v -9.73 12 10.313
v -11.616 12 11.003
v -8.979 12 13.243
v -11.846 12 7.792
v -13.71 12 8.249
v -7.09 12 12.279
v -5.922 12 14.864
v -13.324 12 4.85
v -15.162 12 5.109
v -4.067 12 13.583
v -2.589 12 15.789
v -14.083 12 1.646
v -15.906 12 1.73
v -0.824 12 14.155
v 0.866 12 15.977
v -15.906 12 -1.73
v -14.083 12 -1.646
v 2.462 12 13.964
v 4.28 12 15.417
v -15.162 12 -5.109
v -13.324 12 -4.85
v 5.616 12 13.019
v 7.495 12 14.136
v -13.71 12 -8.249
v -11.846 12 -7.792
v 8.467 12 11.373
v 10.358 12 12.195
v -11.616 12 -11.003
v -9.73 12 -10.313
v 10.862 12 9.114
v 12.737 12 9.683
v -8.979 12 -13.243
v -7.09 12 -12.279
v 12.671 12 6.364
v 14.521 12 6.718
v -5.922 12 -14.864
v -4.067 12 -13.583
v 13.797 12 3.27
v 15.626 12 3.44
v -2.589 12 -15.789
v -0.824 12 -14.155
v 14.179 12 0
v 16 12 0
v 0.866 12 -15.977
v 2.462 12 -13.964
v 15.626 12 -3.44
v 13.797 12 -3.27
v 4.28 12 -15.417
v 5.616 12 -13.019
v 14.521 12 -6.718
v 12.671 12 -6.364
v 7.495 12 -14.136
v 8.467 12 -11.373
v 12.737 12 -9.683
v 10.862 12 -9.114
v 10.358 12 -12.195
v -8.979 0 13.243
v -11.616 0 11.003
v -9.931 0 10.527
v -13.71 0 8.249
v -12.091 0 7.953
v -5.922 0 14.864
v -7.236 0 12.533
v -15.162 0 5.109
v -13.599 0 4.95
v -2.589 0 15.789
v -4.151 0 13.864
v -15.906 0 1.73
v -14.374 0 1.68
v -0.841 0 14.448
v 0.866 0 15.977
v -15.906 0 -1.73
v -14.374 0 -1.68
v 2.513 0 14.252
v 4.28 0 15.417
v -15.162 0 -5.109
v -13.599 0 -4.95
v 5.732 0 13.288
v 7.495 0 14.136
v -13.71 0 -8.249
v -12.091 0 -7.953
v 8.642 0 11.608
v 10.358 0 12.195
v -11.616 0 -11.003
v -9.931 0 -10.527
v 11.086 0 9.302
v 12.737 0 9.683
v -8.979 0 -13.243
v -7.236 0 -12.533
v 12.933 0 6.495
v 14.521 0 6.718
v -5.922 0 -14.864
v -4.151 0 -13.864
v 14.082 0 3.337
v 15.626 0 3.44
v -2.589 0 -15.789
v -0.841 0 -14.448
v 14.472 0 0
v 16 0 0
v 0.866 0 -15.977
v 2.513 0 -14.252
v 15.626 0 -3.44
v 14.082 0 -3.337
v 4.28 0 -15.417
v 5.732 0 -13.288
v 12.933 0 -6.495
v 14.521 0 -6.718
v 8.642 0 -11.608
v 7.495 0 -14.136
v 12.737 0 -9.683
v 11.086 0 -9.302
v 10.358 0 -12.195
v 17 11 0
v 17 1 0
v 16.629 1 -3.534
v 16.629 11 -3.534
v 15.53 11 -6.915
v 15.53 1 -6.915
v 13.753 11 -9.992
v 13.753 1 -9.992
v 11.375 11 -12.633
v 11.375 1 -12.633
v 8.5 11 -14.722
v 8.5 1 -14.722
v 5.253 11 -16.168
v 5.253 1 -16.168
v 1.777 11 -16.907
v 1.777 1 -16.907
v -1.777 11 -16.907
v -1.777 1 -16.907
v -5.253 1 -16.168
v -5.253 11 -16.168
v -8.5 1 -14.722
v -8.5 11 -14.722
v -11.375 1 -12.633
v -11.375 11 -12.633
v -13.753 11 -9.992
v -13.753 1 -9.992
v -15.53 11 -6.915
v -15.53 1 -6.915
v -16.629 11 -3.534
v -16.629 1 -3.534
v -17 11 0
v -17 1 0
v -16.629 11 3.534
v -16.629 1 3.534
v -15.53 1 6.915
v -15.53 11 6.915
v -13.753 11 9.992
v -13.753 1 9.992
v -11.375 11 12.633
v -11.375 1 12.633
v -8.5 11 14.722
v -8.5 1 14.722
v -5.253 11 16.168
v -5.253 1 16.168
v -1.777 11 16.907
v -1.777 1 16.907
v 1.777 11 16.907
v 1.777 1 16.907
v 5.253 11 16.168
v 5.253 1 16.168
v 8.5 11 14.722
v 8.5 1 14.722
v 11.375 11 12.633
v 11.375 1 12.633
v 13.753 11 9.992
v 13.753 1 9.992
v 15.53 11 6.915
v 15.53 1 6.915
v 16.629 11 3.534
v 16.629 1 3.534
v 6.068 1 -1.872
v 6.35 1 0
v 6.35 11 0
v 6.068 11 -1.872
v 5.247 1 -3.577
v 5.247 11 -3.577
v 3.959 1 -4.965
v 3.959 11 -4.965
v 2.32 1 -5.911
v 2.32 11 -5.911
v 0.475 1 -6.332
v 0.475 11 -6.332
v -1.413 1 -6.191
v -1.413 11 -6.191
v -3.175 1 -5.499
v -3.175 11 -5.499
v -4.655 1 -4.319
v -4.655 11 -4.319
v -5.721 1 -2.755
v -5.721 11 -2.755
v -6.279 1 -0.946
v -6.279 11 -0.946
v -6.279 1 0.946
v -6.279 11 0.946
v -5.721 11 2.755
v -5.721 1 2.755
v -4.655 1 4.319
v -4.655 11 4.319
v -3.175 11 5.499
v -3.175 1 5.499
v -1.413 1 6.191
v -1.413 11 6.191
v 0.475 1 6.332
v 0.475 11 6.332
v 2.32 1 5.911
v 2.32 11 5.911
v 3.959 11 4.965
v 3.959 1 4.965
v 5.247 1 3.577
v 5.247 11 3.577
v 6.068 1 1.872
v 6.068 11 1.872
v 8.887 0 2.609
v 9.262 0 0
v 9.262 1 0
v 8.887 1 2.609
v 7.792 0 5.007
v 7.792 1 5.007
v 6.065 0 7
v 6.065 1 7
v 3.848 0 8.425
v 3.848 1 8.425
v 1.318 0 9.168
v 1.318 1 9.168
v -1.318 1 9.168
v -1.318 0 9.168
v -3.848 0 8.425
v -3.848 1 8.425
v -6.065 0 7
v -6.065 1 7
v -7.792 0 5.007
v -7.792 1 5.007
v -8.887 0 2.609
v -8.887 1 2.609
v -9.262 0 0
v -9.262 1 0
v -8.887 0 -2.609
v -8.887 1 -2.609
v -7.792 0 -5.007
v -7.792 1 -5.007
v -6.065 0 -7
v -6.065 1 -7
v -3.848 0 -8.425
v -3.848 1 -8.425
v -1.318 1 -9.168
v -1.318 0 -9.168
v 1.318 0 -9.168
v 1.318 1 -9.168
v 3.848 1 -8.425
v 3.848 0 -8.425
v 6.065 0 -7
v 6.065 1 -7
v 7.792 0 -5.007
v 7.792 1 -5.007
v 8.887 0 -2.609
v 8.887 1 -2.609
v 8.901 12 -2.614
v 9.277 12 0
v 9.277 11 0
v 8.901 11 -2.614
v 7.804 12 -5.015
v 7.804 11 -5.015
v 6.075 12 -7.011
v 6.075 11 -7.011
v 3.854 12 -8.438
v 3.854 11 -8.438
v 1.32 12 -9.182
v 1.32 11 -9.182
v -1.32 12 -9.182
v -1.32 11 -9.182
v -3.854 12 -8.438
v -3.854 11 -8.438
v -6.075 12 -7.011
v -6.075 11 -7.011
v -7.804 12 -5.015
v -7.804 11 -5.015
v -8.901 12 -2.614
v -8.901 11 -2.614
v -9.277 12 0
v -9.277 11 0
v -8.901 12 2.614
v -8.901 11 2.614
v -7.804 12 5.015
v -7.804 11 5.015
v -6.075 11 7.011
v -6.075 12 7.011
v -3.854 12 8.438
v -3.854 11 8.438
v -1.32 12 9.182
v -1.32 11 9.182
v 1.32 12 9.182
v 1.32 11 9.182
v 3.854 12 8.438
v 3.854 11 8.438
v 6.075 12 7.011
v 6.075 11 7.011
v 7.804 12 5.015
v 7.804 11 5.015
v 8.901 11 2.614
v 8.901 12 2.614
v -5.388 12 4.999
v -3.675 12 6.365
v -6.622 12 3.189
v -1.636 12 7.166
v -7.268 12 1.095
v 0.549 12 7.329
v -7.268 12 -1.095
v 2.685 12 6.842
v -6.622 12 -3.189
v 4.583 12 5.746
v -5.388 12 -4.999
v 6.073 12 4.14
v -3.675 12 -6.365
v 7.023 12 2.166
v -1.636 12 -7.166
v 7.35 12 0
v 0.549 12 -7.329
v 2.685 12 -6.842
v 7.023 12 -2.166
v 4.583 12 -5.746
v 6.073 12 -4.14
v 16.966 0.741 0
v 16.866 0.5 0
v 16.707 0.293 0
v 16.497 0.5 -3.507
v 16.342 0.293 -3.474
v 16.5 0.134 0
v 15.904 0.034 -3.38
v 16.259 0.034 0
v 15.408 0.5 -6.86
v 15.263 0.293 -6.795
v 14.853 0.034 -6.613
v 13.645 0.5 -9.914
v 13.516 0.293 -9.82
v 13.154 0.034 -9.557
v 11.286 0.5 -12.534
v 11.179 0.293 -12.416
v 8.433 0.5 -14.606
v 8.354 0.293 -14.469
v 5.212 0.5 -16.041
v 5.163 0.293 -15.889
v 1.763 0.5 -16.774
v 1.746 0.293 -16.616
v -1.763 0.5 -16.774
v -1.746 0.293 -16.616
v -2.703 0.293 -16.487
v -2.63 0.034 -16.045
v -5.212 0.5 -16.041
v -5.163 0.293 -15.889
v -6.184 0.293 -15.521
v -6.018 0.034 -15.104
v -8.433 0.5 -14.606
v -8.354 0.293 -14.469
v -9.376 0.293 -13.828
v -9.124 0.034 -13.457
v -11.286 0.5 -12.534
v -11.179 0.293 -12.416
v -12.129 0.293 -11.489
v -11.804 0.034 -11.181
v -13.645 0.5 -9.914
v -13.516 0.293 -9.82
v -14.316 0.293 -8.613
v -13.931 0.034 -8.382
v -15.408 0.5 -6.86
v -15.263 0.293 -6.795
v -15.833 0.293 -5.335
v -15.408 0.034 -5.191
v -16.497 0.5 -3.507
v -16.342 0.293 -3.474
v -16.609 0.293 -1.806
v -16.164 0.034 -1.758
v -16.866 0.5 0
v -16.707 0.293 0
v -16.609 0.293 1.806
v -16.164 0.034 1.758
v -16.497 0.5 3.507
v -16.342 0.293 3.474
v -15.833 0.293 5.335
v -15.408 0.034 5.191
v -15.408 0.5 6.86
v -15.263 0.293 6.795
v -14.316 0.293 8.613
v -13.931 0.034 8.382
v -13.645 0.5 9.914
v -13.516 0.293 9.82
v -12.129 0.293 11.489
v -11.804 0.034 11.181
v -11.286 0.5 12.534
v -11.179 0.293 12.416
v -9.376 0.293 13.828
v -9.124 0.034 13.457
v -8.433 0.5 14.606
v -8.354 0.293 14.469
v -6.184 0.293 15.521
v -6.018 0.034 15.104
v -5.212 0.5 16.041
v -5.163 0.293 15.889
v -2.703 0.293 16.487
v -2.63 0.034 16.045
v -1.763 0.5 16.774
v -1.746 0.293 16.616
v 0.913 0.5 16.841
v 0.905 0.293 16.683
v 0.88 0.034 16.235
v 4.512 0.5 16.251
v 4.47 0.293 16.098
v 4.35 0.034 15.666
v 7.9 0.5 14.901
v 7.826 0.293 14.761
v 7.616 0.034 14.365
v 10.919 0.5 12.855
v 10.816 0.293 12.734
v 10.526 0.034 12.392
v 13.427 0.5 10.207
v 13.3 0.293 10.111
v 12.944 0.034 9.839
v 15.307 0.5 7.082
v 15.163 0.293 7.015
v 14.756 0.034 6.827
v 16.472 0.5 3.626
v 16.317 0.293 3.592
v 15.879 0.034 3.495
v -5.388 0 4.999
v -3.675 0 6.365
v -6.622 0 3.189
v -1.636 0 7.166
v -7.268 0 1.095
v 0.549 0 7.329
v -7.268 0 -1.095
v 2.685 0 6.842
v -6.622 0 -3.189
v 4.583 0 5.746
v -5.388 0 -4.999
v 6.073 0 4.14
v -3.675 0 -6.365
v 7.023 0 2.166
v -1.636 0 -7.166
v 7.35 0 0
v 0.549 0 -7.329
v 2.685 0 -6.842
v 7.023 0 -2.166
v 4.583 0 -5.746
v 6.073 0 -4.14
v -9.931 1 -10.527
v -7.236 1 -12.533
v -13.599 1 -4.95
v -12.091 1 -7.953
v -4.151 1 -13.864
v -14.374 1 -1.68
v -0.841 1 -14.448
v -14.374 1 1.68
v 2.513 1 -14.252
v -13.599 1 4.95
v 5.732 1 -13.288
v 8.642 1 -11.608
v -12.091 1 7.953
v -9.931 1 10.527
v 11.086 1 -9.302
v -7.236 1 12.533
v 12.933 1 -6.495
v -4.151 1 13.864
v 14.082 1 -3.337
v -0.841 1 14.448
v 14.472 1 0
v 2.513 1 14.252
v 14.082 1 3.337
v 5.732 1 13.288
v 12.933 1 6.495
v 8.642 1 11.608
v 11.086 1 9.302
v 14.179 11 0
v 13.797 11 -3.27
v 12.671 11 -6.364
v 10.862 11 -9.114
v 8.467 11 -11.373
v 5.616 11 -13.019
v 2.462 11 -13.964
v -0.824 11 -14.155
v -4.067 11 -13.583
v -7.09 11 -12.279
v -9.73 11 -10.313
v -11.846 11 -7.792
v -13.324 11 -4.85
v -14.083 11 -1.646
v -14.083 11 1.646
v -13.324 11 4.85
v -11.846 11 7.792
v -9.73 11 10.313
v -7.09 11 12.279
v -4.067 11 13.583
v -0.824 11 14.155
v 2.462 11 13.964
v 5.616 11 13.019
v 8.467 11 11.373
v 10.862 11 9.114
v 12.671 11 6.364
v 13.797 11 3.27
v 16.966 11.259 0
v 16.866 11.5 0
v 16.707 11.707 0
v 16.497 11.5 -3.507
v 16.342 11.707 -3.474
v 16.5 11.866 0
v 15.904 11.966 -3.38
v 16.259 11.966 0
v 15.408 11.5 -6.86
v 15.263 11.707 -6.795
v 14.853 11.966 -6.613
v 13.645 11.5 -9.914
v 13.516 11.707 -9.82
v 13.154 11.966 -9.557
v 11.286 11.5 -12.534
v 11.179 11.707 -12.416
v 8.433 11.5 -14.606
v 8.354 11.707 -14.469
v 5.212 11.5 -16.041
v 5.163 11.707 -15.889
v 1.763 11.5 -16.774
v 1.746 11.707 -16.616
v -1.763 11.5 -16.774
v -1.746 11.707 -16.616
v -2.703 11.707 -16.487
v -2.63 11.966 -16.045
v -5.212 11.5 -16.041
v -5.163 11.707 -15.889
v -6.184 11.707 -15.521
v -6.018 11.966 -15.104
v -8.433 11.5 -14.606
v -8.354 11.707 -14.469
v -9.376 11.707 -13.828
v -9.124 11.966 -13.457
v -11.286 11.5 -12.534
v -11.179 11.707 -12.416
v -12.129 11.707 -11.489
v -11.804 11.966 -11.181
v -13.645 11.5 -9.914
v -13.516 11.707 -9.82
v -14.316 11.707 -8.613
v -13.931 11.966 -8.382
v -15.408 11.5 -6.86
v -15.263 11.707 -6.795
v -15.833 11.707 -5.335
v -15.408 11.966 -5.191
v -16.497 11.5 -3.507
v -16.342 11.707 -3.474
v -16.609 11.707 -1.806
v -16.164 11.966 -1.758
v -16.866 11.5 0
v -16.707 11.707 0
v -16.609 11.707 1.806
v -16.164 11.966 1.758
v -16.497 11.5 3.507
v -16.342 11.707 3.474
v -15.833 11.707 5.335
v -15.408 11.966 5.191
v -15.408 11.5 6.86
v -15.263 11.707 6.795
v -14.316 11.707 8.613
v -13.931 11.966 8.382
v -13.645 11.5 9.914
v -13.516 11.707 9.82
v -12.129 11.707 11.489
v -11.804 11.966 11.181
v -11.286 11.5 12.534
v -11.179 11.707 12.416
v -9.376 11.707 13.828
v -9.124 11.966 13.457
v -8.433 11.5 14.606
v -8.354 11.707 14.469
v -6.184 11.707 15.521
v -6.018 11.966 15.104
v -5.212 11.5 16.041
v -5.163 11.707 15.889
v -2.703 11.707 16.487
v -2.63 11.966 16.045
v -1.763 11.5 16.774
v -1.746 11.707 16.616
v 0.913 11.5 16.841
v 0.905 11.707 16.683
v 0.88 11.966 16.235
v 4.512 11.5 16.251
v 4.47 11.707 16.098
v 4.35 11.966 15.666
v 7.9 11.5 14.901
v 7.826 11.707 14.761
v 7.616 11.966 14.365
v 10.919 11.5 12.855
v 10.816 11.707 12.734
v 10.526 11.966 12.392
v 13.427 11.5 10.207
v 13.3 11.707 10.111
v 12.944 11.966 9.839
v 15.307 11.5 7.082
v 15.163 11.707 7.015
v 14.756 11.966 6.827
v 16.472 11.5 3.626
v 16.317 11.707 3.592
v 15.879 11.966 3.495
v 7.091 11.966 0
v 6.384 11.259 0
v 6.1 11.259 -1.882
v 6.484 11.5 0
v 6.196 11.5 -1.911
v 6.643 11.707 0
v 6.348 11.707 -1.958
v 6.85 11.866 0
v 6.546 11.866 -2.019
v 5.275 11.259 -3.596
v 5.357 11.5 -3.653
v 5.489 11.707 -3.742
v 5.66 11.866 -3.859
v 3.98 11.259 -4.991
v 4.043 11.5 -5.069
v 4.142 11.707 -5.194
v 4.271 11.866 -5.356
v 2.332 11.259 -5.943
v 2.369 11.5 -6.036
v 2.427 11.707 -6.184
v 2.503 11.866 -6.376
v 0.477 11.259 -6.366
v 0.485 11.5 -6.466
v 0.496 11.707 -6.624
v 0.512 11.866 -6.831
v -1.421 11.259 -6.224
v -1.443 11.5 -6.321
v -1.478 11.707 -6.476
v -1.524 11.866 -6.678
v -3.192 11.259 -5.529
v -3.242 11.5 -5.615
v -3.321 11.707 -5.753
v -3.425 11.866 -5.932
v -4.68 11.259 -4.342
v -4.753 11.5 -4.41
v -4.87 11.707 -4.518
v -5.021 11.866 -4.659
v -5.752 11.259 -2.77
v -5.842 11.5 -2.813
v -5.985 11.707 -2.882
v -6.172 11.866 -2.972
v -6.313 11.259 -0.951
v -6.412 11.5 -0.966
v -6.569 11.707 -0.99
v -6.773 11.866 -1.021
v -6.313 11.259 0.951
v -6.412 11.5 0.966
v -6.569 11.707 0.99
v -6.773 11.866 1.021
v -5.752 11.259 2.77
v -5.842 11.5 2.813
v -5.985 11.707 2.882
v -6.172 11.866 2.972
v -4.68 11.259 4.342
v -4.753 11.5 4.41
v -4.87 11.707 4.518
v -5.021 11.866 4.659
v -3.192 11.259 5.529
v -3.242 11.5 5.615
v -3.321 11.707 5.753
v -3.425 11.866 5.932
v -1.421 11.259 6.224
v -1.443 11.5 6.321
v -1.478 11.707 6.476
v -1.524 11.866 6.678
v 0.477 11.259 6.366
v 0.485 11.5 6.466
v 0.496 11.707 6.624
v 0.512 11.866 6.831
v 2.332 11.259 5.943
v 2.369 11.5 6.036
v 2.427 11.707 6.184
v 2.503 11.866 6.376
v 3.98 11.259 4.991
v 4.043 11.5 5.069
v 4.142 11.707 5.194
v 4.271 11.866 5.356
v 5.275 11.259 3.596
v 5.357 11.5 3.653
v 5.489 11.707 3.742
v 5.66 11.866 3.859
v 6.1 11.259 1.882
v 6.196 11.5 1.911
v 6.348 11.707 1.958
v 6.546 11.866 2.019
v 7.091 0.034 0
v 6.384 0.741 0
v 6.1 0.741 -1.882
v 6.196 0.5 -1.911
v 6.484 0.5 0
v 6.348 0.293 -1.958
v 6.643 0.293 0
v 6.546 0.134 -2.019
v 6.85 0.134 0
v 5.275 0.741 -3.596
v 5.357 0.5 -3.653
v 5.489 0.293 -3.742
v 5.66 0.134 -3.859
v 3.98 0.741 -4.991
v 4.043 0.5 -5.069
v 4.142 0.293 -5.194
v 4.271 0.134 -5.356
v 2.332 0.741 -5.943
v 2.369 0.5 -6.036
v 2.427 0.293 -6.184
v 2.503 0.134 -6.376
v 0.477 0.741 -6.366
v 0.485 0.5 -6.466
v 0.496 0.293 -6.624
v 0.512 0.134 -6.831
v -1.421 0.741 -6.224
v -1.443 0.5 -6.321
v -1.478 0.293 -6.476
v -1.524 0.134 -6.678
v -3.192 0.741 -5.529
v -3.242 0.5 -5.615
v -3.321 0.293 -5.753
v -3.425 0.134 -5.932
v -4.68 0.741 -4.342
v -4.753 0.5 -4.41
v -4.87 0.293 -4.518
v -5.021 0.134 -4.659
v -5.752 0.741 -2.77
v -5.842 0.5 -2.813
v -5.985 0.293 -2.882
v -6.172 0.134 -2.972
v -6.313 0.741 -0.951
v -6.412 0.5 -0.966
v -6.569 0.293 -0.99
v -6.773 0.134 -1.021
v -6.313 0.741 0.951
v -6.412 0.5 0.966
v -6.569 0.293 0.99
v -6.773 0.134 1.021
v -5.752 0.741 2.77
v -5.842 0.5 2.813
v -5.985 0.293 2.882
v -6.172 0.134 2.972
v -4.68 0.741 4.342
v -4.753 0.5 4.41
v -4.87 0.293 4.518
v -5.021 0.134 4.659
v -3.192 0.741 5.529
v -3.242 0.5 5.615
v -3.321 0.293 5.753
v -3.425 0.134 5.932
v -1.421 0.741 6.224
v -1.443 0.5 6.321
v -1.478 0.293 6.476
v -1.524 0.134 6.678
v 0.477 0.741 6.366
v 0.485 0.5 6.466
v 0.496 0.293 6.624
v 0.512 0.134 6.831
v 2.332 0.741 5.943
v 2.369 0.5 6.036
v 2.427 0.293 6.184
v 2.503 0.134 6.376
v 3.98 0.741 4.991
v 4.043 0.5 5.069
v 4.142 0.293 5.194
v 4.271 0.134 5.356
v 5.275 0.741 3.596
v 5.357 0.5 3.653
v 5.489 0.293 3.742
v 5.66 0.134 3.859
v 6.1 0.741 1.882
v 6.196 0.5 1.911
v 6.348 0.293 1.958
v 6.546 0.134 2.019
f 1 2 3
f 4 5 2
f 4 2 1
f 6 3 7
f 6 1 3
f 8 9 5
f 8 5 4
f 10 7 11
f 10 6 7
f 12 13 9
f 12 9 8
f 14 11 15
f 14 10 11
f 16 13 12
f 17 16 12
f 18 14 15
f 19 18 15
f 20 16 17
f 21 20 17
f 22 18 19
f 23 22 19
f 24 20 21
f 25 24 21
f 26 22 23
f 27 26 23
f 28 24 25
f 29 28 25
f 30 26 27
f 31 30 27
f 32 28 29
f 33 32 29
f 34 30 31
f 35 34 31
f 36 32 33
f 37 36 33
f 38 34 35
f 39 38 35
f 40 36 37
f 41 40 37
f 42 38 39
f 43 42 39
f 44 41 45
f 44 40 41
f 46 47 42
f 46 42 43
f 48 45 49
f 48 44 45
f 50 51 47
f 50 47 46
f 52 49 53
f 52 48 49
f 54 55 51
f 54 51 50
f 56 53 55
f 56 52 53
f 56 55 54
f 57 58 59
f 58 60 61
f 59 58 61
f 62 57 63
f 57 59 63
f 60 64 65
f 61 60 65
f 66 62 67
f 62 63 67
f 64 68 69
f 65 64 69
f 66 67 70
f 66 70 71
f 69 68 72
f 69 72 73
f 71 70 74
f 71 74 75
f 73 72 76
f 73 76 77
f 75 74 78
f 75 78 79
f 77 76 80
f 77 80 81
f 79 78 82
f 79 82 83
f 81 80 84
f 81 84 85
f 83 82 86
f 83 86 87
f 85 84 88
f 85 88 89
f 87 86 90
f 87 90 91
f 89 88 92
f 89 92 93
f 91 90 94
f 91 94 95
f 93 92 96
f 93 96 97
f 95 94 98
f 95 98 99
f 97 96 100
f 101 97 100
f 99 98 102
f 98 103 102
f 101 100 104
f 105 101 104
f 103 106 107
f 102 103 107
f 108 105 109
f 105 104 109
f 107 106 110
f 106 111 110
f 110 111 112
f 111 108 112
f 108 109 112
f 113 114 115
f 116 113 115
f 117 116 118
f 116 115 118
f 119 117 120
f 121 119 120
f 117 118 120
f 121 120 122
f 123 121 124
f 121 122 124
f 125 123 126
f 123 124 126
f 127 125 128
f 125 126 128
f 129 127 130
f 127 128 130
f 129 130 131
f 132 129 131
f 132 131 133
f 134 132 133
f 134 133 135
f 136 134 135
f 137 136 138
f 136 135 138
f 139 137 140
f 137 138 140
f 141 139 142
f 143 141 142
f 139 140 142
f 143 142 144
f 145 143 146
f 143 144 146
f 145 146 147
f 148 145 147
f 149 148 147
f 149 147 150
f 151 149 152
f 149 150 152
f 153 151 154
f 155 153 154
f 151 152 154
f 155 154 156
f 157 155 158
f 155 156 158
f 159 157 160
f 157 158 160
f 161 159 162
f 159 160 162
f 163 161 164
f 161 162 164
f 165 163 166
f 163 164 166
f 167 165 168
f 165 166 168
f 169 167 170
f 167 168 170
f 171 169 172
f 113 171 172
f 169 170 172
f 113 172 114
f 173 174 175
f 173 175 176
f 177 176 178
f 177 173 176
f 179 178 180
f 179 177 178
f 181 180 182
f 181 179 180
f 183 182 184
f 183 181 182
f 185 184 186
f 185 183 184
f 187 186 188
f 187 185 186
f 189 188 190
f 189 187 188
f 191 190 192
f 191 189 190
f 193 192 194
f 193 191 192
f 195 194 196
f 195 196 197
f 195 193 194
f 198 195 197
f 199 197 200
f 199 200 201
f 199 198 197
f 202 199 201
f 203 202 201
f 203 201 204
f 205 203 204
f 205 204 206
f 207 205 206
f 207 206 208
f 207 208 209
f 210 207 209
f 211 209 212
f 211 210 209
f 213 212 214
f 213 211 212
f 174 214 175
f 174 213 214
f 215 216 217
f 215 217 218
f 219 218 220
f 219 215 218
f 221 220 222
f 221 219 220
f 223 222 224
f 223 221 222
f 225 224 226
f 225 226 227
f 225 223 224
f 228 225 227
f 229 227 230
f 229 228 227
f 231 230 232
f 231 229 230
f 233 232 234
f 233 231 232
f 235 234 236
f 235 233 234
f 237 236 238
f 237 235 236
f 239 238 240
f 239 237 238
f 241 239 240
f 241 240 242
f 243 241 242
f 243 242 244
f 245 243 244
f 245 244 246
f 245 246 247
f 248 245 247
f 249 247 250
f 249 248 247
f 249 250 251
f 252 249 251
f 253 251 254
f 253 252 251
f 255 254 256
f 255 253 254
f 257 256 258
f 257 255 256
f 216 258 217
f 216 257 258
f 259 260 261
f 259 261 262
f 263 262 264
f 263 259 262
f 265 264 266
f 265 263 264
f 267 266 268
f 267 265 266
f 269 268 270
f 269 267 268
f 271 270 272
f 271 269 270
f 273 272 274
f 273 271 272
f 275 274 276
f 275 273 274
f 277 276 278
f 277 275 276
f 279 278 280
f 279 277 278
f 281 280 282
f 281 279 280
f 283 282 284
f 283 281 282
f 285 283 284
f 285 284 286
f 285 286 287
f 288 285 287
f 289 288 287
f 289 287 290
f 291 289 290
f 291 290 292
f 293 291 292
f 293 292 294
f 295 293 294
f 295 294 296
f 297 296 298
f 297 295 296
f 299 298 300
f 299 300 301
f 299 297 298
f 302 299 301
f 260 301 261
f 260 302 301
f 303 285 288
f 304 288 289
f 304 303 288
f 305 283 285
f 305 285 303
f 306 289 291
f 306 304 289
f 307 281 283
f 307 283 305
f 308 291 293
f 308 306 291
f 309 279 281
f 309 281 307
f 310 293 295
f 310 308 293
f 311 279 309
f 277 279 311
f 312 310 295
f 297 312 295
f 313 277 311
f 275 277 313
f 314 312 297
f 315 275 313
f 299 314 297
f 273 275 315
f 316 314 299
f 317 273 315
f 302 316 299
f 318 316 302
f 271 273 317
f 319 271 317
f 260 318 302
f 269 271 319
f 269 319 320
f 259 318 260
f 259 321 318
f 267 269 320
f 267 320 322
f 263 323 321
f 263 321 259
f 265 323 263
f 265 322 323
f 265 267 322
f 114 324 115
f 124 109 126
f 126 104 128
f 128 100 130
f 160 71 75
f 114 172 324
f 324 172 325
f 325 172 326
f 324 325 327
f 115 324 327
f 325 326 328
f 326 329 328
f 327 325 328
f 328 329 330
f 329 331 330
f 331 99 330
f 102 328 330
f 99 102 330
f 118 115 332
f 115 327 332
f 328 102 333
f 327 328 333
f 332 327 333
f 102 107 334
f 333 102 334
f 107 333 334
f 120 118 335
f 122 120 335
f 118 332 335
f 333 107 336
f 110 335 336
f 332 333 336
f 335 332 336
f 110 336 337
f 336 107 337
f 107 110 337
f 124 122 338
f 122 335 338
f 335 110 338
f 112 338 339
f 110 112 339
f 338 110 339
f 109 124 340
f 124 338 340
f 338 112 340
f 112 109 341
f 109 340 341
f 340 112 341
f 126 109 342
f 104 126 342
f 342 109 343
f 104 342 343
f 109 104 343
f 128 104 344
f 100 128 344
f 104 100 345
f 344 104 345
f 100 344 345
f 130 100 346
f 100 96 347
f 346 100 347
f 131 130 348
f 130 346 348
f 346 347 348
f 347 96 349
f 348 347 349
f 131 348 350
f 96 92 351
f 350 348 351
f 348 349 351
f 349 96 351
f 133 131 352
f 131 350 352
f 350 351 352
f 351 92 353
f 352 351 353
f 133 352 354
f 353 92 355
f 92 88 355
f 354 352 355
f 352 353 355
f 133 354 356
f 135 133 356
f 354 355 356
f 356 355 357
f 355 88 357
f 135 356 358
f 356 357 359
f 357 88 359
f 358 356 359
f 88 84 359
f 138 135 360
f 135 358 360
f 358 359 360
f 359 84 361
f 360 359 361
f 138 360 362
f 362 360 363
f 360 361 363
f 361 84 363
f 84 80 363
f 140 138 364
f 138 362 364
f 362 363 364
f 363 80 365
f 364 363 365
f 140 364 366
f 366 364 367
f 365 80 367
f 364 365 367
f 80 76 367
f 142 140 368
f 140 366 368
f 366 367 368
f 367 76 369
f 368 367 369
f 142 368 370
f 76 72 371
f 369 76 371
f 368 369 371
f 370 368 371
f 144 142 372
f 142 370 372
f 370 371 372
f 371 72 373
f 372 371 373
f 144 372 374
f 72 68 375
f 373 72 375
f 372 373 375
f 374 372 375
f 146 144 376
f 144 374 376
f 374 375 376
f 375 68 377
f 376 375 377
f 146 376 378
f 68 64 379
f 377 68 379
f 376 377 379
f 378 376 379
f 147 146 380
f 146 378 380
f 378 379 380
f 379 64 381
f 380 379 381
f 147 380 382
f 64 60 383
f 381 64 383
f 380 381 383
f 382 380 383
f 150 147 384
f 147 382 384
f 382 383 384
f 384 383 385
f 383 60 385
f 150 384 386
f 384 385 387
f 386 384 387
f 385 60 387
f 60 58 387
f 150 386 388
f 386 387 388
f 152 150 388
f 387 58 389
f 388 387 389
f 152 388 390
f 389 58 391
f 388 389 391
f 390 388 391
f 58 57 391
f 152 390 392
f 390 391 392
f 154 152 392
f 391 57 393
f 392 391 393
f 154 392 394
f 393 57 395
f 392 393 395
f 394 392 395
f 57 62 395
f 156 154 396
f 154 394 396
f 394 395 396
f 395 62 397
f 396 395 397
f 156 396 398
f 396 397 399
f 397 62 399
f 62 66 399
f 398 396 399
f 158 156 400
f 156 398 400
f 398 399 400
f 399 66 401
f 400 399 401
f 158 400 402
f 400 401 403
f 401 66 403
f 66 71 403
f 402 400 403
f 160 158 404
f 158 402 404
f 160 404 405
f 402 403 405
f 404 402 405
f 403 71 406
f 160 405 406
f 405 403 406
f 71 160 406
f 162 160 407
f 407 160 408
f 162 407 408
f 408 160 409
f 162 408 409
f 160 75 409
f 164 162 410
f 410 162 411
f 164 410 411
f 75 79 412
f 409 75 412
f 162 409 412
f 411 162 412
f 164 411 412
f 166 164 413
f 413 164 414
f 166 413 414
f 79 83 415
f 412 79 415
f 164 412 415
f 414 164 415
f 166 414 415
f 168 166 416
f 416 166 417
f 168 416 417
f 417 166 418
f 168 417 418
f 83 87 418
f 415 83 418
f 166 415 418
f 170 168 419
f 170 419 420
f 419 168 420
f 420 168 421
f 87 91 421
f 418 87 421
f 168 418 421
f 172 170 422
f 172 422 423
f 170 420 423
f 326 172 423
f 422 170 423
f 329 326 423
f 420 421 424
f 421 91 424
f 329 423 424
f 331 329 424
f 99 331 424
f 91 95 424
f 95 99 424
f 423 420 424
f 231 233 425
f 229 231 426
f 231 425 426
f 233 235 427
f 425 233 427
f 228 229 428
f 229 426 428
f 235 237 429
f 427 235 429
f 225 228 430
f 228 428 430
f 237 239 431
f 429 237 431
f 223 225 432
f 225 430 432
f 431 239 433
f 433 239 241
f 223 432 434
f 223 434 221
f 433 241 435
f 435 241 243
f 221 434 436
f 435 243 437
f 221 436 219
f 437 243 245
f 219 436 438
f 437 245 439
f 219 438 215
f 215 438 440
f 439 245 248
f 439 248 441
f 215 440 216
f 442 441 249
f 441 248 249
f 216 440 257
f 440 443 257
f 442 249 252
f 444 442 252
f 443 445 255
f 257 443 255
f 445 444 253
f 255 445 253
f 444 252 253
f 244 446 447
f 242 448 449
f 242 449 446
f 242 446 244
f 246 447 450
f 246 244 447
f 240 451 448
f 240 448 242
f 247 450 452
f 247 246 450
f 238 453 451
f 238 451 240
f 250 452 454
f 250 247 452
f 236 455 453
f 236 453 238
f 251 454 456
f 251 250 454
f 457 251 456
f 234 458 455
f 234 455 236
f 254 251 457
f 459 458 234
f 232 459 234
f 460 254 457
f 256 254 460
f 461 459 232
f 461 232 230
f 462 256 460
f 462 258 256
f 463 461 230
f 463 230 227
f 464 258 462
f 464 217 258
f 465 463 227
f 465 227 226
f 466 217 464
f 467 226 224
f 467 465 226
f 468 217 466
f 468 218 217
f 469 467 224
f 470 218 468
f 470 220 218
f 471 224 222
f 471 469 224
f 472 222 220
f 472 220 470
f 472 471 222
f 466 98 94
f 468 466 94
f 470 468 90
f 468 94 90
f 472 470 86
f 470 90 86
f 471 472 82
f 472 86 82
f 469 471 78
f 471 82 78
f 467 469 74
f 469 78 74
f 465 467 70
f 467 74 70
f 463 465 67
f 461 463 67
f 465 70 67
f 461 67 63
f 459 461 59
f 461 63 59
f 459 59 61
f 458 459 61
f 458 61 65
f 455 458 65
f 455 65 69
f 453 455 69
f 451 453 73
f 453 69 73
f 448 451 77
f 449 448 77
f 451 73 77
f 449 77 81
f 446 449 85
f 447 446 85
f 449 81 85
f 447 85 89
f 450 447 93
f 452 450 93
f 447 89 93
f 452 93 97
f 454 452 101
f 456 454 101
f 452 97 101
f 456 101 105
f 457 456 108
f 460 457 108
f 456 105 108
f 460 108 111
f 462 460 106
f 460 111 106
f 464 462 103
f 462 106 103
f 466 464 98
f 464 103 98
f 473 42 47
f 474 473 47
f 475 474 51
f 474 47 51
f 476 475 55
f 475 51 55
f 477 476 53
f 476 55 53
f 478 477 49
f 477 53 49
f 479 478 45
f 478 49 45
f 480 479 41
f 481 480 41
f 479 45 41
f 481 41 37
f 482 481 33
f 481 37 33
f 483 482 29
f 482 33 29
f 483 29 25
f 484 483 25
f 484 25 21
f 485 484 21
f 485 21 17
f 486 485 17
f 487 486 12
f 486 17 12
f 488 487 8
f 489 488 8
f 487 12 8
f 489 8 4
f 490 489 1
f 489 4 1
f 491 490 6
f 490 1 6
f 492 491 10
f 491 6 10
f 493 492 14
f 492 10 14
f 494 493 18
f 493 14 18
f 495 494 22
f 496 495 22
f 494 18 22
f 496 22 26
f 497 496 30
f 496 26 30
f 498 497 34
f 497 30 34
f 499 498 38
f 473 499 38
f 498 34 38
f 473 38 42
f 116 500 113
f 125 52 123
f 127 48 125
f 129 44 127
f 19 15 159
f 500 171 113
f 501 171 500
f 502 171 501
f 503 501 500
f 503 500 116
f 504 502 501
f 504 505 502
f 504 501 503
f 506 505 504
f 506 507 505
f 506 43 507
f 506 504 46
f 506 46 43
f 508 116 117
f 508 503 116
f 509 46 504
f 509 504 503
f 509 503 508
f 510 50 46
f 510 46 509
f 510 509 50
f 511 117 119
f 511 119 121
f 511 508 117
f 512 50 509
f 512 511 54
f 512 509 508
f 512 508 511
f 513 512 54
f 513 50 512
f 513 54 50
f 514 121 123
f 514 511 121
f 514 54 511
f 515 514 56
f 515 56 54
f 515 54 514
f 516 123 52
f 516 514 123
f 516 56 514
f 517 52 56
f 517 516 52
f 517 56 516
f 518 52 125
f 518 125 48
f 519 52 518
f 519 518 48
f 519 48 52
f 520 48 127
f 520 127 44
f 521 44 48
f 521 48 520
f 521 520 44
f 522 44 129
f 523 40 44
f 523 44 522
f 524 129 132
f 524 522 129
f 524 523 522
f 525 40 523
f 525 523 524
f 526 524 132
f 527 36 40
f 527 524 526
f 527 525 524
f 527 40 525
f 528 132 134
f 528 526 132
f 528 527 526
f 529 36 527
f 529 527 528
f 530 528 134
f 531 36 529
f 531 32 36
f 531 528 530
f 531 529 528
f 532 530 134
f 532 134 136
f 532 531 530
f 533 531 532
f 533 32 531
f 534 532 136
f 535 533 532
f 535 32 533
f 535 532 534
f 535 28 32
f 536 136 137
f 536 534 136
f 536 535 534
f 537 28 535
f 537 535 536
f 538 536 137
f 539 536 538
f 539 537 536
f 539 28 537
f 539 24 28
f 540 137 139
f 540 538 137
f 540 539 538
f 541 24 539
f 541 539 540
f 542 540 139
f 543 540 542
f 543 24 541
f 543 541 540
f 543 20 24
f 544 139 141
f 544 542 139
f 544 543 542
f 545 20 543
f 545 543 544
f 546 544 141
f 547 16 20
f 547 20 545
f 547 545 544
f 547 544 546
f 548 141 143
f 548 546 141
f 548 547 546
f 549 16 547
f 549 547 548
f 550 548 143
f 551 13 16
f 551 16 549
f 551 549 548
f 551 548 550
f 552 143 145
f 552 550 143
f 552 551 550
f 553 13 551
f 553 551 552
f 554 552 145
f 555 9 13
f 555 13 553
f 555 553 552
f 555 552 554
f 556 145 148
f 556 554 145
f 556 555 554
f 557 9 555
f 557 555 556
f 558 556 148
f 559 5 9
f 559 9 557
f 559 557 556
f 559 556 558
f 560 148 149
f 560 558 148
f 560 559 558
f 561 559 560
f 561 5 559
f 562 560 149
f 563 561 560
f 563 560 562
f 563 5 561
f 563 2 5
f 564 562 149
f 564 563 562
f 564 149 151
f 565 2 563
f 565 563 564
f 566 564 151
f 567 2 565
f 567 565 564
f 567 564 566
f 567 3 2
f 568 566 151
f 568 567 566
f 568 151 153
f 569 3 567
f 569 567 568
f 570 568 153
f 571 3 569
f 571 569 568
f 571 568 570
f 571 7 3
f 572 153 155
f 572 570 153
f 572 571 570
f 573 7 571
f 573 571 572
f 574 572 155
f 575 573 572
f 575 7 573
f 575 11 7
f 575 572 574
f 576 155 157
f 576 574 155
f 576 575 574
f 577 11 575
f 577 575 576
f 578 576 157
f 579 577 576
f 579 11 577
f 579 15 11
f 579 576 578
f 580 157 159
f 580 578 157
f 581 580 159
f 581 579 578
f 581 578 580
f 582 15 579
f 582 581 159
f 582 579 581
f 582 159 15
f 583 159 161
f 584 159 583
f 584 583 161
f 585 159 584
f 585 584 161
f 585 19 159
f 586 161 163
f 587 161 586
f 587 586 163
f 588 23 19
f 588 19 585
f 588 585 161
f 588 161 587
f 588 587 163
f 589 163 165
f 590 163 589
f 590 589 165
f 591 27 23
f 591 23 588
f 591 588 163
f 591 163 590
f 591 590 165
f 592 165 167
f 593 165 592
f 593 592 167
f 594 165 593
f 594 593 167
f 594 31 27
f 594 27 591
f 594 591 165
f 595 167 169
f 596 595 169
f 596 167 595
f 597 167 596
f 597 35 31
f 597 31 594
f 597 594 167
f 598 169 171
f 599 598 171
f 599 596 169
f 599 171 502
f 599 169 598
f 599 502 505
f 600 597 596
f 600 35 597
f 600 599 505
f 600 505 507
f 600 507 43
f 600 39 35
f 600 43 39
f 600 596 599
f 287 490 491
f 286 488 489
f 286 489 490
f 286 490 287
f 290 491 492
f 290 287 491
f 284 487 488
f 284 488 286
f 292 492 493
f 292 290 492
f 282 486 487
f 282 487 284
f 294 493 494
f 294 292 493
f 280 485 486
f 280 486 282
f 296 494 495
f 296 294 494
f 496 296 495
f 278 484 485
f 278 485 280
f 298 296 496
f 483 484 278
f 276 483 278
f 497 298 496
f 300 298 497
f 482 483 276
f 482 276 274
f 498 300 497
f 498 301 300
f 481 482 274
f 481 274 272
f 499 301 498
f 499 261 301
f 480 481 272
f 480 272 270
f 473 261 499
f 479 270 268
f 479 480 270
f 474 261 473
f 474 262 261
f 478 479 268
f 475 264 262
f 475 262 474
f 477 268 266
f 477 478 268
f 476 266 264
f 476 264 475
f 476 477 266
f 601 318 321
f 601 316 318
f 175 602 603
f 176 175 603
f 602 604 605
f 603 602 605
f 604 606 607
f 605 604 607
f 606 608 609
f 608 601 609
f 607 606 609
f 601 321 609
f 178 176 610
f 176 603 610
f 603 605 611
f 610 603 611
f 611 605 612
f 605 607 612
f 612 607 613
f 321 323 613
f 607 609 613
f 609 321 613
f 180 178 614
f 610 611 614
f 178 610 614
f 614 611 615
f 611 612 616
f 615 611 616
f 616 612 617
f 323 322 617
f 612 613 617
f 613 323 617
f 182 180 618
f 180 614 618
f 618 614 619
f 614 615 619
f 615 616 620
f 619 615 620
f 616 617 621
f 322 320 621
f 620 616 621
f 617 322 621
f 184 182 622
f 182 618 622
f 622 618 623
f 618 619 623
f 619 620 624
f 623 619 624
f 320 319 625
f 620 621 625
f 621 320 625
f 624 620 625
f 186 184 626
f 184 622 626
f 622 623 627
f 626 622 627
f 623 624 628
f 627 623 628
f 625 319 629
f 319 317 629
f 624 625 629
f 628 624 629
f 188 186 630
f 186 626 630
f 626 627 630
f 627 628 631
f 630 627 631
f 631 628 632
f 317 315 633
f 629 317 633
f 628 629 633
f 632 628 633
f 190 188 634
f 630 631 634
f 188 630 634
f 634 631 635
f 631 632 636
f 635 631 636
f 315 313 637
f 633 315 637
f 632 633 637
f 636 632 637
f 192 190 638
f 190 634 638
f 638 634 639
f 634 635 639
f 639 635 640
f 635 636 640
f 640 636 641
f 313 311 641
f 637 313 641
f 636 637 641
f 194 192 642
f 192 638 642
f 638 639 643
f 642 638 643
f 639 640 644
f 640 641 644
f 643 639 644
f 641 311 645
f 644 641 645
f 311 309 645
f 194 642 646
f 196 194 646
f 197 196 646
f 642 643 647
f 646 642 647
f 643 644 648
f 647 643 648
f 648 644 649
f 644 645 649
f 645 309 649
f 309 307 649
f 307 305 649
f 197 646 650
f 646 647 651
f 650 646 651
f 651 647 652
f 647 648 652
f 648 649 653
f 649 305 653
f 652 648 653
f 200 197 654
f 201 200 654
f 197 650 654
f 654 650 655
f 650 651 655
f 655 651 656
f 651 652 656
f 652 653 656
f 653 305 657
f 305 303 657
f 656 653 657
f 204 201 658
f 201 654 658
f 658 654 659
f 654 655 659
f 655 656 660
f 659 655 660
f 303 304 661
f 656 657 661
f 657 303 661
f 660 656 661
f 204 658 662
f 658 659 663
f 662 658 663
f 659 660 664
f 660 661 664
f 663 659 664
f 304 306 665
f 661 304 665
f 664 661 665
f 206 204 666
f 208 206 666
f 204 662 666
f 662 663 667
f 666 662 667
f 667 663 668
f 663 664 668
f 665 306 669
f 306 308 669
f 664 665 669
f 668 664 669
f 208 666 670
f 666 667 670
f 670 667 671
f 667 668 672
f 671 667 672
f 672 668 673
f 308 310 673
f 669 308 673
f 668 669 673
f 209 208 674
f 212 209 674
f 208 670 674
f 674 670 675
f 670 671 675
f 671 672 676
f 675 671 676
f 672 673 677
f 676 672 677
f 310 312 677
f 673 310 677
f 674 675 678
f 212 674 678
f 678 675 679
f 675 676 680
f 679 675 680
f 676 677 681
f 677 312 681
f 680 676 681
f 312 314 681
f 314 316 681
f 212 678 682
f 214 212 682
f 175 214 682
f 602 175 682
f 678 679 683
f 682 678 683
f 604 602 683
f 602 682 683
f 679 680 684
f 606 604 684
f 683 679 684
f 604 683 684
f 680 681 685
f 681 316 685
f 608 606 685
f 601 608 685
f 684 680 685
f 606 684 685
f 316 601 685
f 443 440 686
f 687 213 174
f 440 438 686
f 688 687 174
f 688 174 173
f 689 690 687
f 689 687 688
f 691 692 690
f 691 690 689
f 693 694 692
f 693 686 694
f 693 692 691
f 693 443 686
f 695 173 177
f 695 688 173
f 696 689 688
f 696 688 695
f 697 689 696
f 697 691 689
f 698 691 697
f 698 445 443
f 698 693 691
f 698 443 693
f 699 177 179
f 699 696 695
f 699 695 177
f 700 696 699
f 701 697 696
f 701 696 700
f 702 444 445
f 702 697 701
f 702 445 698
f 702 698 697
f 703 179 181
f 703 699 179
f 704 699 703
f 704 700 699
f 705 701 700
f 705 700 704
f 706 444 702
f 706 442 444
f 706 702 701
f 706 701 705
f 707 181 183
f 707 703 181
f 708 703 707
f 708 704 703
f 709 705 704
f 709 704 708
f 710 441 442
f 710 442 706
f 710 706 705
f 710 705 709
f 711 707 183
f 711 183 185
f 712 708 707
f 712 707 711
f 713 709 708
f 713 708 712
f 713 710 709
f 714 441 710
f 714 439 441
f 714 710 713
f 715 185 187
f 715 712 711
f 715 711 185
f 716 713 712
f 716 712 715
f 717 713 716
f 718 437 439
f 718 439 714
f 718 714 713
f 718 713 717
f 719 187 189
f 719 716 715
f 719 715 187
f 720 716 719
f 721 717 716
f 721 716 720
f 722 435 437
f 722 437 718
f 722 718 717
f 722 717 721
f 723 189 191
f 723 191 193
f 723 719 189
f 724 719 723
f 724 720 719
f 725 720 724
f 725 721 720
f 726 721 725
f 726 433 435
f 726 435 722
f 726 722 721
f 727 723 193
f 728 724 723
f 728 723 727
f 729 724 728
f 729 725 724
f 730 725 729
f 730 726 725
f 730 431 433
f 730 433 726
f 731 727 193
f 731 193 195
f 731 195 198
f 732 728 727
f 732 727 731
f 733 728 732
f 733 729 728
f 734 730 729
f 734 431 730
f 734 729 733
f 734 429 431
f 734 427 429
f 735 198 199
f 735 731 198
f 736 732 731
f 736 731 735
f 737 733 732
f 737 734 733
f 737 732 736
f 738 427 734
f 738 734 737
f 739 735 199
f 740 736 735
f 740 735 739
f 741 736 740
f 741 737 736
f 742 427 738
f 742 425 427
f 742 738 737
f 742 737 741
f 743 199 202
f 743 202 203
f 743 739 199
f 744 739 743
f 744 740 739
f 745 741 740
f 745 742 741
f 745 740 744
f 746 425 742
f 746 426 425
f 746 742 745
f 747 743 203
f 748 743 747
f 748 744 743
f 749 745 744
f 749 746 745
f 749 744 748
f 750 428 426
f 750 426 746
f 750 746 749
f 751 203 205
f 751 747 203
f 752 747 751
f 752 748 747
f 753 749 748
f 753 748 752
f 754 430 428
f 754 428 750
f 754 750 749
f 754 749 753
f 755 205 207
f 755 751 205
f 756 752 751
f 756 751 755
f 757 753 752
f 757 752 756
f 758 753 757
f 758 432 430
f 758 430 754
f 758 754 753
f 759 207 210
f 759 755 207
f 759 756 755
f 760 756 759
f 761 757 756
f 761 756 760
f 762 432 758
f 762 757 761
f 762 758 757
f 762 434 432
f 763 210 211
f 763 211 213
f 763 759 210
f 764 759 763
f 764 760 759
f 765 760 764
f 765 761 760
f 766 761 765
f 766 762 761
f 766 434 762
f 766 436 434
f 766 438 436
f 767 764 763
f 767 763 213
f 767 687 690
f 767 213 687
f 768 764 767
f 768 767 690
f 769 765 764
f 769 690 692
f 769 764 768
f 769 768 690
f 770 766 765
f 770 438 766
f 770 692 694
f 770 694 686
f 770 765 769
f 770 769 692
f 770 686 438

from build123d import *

# Parameters (mm, degrees)
SKETCH1_R           = 17
SKETCH1_R_2         = 6.35
BOSS_EXTRUDE1_DEPTH = 12
FILLET1_R           = 1
SKETCH2_R           = 14.179085796
SKETCH2_R_2         = 9.276544236
CUT_EXTRUDE1_DEPTH  = 1
SKETCH3_R           = 14.472019466
SKETCH3_R_2         = 9.262101897
CUT_EXTRUDE2_DEPTH  = 1


with BuildPart() as part:
    # Sketch1 → Boss-Extrude1 (new body)
    with BuildSketch(Plane(origin=(0, 0, 0), x_dir=(1, 0, 0), z_dir=(0, 1, 0))):
        Circle(SKETCH1_R)
        Circle(SKETCH1_R_2, mode=Mode.SUBTRACT)
    extrude(amount=BOSS_EXTRUDE1_DEPTH)

    # Fillet1
    fillet1_edges = [part.edges().sort_by_distance(p)[0] for p in [
        (-17, 0, 0),
        (-17, 12, 0),
        (-6.35, 0, 0),
        (-6.35, 12, 0),
    ]]
    fillet(fillet1_edges, radius=FILLET1_R)

    # Sketch2 → Cut-Extrude1 (cut)
    with BuildSketch(Plane(origin=(0, 12, 0), x_dir=(1, 0, 0), z_dir=(0, 1, 0))):
        Circle(SKETCH2_R)
        Circle(SKETCH2_R_2, mode=Mode.SUBTRACT)
    extrude(amount=-CUT_EXTRUDE1_DEPTH, mode=Mode.SUBTRACT)

    # Sketch3 → Cut-Extrude2 (cut)
    with BuildSketch(Plane.XZ):
        Circle(SKETCH3_R)
        Circle(SKETCH3_R_2, mode=Mode.SUBTRACT)
    extrude(amount=-CUT_EXTRUDE2_DEPTH, mode=Mode.SUBTRACT)


solid = part.part
